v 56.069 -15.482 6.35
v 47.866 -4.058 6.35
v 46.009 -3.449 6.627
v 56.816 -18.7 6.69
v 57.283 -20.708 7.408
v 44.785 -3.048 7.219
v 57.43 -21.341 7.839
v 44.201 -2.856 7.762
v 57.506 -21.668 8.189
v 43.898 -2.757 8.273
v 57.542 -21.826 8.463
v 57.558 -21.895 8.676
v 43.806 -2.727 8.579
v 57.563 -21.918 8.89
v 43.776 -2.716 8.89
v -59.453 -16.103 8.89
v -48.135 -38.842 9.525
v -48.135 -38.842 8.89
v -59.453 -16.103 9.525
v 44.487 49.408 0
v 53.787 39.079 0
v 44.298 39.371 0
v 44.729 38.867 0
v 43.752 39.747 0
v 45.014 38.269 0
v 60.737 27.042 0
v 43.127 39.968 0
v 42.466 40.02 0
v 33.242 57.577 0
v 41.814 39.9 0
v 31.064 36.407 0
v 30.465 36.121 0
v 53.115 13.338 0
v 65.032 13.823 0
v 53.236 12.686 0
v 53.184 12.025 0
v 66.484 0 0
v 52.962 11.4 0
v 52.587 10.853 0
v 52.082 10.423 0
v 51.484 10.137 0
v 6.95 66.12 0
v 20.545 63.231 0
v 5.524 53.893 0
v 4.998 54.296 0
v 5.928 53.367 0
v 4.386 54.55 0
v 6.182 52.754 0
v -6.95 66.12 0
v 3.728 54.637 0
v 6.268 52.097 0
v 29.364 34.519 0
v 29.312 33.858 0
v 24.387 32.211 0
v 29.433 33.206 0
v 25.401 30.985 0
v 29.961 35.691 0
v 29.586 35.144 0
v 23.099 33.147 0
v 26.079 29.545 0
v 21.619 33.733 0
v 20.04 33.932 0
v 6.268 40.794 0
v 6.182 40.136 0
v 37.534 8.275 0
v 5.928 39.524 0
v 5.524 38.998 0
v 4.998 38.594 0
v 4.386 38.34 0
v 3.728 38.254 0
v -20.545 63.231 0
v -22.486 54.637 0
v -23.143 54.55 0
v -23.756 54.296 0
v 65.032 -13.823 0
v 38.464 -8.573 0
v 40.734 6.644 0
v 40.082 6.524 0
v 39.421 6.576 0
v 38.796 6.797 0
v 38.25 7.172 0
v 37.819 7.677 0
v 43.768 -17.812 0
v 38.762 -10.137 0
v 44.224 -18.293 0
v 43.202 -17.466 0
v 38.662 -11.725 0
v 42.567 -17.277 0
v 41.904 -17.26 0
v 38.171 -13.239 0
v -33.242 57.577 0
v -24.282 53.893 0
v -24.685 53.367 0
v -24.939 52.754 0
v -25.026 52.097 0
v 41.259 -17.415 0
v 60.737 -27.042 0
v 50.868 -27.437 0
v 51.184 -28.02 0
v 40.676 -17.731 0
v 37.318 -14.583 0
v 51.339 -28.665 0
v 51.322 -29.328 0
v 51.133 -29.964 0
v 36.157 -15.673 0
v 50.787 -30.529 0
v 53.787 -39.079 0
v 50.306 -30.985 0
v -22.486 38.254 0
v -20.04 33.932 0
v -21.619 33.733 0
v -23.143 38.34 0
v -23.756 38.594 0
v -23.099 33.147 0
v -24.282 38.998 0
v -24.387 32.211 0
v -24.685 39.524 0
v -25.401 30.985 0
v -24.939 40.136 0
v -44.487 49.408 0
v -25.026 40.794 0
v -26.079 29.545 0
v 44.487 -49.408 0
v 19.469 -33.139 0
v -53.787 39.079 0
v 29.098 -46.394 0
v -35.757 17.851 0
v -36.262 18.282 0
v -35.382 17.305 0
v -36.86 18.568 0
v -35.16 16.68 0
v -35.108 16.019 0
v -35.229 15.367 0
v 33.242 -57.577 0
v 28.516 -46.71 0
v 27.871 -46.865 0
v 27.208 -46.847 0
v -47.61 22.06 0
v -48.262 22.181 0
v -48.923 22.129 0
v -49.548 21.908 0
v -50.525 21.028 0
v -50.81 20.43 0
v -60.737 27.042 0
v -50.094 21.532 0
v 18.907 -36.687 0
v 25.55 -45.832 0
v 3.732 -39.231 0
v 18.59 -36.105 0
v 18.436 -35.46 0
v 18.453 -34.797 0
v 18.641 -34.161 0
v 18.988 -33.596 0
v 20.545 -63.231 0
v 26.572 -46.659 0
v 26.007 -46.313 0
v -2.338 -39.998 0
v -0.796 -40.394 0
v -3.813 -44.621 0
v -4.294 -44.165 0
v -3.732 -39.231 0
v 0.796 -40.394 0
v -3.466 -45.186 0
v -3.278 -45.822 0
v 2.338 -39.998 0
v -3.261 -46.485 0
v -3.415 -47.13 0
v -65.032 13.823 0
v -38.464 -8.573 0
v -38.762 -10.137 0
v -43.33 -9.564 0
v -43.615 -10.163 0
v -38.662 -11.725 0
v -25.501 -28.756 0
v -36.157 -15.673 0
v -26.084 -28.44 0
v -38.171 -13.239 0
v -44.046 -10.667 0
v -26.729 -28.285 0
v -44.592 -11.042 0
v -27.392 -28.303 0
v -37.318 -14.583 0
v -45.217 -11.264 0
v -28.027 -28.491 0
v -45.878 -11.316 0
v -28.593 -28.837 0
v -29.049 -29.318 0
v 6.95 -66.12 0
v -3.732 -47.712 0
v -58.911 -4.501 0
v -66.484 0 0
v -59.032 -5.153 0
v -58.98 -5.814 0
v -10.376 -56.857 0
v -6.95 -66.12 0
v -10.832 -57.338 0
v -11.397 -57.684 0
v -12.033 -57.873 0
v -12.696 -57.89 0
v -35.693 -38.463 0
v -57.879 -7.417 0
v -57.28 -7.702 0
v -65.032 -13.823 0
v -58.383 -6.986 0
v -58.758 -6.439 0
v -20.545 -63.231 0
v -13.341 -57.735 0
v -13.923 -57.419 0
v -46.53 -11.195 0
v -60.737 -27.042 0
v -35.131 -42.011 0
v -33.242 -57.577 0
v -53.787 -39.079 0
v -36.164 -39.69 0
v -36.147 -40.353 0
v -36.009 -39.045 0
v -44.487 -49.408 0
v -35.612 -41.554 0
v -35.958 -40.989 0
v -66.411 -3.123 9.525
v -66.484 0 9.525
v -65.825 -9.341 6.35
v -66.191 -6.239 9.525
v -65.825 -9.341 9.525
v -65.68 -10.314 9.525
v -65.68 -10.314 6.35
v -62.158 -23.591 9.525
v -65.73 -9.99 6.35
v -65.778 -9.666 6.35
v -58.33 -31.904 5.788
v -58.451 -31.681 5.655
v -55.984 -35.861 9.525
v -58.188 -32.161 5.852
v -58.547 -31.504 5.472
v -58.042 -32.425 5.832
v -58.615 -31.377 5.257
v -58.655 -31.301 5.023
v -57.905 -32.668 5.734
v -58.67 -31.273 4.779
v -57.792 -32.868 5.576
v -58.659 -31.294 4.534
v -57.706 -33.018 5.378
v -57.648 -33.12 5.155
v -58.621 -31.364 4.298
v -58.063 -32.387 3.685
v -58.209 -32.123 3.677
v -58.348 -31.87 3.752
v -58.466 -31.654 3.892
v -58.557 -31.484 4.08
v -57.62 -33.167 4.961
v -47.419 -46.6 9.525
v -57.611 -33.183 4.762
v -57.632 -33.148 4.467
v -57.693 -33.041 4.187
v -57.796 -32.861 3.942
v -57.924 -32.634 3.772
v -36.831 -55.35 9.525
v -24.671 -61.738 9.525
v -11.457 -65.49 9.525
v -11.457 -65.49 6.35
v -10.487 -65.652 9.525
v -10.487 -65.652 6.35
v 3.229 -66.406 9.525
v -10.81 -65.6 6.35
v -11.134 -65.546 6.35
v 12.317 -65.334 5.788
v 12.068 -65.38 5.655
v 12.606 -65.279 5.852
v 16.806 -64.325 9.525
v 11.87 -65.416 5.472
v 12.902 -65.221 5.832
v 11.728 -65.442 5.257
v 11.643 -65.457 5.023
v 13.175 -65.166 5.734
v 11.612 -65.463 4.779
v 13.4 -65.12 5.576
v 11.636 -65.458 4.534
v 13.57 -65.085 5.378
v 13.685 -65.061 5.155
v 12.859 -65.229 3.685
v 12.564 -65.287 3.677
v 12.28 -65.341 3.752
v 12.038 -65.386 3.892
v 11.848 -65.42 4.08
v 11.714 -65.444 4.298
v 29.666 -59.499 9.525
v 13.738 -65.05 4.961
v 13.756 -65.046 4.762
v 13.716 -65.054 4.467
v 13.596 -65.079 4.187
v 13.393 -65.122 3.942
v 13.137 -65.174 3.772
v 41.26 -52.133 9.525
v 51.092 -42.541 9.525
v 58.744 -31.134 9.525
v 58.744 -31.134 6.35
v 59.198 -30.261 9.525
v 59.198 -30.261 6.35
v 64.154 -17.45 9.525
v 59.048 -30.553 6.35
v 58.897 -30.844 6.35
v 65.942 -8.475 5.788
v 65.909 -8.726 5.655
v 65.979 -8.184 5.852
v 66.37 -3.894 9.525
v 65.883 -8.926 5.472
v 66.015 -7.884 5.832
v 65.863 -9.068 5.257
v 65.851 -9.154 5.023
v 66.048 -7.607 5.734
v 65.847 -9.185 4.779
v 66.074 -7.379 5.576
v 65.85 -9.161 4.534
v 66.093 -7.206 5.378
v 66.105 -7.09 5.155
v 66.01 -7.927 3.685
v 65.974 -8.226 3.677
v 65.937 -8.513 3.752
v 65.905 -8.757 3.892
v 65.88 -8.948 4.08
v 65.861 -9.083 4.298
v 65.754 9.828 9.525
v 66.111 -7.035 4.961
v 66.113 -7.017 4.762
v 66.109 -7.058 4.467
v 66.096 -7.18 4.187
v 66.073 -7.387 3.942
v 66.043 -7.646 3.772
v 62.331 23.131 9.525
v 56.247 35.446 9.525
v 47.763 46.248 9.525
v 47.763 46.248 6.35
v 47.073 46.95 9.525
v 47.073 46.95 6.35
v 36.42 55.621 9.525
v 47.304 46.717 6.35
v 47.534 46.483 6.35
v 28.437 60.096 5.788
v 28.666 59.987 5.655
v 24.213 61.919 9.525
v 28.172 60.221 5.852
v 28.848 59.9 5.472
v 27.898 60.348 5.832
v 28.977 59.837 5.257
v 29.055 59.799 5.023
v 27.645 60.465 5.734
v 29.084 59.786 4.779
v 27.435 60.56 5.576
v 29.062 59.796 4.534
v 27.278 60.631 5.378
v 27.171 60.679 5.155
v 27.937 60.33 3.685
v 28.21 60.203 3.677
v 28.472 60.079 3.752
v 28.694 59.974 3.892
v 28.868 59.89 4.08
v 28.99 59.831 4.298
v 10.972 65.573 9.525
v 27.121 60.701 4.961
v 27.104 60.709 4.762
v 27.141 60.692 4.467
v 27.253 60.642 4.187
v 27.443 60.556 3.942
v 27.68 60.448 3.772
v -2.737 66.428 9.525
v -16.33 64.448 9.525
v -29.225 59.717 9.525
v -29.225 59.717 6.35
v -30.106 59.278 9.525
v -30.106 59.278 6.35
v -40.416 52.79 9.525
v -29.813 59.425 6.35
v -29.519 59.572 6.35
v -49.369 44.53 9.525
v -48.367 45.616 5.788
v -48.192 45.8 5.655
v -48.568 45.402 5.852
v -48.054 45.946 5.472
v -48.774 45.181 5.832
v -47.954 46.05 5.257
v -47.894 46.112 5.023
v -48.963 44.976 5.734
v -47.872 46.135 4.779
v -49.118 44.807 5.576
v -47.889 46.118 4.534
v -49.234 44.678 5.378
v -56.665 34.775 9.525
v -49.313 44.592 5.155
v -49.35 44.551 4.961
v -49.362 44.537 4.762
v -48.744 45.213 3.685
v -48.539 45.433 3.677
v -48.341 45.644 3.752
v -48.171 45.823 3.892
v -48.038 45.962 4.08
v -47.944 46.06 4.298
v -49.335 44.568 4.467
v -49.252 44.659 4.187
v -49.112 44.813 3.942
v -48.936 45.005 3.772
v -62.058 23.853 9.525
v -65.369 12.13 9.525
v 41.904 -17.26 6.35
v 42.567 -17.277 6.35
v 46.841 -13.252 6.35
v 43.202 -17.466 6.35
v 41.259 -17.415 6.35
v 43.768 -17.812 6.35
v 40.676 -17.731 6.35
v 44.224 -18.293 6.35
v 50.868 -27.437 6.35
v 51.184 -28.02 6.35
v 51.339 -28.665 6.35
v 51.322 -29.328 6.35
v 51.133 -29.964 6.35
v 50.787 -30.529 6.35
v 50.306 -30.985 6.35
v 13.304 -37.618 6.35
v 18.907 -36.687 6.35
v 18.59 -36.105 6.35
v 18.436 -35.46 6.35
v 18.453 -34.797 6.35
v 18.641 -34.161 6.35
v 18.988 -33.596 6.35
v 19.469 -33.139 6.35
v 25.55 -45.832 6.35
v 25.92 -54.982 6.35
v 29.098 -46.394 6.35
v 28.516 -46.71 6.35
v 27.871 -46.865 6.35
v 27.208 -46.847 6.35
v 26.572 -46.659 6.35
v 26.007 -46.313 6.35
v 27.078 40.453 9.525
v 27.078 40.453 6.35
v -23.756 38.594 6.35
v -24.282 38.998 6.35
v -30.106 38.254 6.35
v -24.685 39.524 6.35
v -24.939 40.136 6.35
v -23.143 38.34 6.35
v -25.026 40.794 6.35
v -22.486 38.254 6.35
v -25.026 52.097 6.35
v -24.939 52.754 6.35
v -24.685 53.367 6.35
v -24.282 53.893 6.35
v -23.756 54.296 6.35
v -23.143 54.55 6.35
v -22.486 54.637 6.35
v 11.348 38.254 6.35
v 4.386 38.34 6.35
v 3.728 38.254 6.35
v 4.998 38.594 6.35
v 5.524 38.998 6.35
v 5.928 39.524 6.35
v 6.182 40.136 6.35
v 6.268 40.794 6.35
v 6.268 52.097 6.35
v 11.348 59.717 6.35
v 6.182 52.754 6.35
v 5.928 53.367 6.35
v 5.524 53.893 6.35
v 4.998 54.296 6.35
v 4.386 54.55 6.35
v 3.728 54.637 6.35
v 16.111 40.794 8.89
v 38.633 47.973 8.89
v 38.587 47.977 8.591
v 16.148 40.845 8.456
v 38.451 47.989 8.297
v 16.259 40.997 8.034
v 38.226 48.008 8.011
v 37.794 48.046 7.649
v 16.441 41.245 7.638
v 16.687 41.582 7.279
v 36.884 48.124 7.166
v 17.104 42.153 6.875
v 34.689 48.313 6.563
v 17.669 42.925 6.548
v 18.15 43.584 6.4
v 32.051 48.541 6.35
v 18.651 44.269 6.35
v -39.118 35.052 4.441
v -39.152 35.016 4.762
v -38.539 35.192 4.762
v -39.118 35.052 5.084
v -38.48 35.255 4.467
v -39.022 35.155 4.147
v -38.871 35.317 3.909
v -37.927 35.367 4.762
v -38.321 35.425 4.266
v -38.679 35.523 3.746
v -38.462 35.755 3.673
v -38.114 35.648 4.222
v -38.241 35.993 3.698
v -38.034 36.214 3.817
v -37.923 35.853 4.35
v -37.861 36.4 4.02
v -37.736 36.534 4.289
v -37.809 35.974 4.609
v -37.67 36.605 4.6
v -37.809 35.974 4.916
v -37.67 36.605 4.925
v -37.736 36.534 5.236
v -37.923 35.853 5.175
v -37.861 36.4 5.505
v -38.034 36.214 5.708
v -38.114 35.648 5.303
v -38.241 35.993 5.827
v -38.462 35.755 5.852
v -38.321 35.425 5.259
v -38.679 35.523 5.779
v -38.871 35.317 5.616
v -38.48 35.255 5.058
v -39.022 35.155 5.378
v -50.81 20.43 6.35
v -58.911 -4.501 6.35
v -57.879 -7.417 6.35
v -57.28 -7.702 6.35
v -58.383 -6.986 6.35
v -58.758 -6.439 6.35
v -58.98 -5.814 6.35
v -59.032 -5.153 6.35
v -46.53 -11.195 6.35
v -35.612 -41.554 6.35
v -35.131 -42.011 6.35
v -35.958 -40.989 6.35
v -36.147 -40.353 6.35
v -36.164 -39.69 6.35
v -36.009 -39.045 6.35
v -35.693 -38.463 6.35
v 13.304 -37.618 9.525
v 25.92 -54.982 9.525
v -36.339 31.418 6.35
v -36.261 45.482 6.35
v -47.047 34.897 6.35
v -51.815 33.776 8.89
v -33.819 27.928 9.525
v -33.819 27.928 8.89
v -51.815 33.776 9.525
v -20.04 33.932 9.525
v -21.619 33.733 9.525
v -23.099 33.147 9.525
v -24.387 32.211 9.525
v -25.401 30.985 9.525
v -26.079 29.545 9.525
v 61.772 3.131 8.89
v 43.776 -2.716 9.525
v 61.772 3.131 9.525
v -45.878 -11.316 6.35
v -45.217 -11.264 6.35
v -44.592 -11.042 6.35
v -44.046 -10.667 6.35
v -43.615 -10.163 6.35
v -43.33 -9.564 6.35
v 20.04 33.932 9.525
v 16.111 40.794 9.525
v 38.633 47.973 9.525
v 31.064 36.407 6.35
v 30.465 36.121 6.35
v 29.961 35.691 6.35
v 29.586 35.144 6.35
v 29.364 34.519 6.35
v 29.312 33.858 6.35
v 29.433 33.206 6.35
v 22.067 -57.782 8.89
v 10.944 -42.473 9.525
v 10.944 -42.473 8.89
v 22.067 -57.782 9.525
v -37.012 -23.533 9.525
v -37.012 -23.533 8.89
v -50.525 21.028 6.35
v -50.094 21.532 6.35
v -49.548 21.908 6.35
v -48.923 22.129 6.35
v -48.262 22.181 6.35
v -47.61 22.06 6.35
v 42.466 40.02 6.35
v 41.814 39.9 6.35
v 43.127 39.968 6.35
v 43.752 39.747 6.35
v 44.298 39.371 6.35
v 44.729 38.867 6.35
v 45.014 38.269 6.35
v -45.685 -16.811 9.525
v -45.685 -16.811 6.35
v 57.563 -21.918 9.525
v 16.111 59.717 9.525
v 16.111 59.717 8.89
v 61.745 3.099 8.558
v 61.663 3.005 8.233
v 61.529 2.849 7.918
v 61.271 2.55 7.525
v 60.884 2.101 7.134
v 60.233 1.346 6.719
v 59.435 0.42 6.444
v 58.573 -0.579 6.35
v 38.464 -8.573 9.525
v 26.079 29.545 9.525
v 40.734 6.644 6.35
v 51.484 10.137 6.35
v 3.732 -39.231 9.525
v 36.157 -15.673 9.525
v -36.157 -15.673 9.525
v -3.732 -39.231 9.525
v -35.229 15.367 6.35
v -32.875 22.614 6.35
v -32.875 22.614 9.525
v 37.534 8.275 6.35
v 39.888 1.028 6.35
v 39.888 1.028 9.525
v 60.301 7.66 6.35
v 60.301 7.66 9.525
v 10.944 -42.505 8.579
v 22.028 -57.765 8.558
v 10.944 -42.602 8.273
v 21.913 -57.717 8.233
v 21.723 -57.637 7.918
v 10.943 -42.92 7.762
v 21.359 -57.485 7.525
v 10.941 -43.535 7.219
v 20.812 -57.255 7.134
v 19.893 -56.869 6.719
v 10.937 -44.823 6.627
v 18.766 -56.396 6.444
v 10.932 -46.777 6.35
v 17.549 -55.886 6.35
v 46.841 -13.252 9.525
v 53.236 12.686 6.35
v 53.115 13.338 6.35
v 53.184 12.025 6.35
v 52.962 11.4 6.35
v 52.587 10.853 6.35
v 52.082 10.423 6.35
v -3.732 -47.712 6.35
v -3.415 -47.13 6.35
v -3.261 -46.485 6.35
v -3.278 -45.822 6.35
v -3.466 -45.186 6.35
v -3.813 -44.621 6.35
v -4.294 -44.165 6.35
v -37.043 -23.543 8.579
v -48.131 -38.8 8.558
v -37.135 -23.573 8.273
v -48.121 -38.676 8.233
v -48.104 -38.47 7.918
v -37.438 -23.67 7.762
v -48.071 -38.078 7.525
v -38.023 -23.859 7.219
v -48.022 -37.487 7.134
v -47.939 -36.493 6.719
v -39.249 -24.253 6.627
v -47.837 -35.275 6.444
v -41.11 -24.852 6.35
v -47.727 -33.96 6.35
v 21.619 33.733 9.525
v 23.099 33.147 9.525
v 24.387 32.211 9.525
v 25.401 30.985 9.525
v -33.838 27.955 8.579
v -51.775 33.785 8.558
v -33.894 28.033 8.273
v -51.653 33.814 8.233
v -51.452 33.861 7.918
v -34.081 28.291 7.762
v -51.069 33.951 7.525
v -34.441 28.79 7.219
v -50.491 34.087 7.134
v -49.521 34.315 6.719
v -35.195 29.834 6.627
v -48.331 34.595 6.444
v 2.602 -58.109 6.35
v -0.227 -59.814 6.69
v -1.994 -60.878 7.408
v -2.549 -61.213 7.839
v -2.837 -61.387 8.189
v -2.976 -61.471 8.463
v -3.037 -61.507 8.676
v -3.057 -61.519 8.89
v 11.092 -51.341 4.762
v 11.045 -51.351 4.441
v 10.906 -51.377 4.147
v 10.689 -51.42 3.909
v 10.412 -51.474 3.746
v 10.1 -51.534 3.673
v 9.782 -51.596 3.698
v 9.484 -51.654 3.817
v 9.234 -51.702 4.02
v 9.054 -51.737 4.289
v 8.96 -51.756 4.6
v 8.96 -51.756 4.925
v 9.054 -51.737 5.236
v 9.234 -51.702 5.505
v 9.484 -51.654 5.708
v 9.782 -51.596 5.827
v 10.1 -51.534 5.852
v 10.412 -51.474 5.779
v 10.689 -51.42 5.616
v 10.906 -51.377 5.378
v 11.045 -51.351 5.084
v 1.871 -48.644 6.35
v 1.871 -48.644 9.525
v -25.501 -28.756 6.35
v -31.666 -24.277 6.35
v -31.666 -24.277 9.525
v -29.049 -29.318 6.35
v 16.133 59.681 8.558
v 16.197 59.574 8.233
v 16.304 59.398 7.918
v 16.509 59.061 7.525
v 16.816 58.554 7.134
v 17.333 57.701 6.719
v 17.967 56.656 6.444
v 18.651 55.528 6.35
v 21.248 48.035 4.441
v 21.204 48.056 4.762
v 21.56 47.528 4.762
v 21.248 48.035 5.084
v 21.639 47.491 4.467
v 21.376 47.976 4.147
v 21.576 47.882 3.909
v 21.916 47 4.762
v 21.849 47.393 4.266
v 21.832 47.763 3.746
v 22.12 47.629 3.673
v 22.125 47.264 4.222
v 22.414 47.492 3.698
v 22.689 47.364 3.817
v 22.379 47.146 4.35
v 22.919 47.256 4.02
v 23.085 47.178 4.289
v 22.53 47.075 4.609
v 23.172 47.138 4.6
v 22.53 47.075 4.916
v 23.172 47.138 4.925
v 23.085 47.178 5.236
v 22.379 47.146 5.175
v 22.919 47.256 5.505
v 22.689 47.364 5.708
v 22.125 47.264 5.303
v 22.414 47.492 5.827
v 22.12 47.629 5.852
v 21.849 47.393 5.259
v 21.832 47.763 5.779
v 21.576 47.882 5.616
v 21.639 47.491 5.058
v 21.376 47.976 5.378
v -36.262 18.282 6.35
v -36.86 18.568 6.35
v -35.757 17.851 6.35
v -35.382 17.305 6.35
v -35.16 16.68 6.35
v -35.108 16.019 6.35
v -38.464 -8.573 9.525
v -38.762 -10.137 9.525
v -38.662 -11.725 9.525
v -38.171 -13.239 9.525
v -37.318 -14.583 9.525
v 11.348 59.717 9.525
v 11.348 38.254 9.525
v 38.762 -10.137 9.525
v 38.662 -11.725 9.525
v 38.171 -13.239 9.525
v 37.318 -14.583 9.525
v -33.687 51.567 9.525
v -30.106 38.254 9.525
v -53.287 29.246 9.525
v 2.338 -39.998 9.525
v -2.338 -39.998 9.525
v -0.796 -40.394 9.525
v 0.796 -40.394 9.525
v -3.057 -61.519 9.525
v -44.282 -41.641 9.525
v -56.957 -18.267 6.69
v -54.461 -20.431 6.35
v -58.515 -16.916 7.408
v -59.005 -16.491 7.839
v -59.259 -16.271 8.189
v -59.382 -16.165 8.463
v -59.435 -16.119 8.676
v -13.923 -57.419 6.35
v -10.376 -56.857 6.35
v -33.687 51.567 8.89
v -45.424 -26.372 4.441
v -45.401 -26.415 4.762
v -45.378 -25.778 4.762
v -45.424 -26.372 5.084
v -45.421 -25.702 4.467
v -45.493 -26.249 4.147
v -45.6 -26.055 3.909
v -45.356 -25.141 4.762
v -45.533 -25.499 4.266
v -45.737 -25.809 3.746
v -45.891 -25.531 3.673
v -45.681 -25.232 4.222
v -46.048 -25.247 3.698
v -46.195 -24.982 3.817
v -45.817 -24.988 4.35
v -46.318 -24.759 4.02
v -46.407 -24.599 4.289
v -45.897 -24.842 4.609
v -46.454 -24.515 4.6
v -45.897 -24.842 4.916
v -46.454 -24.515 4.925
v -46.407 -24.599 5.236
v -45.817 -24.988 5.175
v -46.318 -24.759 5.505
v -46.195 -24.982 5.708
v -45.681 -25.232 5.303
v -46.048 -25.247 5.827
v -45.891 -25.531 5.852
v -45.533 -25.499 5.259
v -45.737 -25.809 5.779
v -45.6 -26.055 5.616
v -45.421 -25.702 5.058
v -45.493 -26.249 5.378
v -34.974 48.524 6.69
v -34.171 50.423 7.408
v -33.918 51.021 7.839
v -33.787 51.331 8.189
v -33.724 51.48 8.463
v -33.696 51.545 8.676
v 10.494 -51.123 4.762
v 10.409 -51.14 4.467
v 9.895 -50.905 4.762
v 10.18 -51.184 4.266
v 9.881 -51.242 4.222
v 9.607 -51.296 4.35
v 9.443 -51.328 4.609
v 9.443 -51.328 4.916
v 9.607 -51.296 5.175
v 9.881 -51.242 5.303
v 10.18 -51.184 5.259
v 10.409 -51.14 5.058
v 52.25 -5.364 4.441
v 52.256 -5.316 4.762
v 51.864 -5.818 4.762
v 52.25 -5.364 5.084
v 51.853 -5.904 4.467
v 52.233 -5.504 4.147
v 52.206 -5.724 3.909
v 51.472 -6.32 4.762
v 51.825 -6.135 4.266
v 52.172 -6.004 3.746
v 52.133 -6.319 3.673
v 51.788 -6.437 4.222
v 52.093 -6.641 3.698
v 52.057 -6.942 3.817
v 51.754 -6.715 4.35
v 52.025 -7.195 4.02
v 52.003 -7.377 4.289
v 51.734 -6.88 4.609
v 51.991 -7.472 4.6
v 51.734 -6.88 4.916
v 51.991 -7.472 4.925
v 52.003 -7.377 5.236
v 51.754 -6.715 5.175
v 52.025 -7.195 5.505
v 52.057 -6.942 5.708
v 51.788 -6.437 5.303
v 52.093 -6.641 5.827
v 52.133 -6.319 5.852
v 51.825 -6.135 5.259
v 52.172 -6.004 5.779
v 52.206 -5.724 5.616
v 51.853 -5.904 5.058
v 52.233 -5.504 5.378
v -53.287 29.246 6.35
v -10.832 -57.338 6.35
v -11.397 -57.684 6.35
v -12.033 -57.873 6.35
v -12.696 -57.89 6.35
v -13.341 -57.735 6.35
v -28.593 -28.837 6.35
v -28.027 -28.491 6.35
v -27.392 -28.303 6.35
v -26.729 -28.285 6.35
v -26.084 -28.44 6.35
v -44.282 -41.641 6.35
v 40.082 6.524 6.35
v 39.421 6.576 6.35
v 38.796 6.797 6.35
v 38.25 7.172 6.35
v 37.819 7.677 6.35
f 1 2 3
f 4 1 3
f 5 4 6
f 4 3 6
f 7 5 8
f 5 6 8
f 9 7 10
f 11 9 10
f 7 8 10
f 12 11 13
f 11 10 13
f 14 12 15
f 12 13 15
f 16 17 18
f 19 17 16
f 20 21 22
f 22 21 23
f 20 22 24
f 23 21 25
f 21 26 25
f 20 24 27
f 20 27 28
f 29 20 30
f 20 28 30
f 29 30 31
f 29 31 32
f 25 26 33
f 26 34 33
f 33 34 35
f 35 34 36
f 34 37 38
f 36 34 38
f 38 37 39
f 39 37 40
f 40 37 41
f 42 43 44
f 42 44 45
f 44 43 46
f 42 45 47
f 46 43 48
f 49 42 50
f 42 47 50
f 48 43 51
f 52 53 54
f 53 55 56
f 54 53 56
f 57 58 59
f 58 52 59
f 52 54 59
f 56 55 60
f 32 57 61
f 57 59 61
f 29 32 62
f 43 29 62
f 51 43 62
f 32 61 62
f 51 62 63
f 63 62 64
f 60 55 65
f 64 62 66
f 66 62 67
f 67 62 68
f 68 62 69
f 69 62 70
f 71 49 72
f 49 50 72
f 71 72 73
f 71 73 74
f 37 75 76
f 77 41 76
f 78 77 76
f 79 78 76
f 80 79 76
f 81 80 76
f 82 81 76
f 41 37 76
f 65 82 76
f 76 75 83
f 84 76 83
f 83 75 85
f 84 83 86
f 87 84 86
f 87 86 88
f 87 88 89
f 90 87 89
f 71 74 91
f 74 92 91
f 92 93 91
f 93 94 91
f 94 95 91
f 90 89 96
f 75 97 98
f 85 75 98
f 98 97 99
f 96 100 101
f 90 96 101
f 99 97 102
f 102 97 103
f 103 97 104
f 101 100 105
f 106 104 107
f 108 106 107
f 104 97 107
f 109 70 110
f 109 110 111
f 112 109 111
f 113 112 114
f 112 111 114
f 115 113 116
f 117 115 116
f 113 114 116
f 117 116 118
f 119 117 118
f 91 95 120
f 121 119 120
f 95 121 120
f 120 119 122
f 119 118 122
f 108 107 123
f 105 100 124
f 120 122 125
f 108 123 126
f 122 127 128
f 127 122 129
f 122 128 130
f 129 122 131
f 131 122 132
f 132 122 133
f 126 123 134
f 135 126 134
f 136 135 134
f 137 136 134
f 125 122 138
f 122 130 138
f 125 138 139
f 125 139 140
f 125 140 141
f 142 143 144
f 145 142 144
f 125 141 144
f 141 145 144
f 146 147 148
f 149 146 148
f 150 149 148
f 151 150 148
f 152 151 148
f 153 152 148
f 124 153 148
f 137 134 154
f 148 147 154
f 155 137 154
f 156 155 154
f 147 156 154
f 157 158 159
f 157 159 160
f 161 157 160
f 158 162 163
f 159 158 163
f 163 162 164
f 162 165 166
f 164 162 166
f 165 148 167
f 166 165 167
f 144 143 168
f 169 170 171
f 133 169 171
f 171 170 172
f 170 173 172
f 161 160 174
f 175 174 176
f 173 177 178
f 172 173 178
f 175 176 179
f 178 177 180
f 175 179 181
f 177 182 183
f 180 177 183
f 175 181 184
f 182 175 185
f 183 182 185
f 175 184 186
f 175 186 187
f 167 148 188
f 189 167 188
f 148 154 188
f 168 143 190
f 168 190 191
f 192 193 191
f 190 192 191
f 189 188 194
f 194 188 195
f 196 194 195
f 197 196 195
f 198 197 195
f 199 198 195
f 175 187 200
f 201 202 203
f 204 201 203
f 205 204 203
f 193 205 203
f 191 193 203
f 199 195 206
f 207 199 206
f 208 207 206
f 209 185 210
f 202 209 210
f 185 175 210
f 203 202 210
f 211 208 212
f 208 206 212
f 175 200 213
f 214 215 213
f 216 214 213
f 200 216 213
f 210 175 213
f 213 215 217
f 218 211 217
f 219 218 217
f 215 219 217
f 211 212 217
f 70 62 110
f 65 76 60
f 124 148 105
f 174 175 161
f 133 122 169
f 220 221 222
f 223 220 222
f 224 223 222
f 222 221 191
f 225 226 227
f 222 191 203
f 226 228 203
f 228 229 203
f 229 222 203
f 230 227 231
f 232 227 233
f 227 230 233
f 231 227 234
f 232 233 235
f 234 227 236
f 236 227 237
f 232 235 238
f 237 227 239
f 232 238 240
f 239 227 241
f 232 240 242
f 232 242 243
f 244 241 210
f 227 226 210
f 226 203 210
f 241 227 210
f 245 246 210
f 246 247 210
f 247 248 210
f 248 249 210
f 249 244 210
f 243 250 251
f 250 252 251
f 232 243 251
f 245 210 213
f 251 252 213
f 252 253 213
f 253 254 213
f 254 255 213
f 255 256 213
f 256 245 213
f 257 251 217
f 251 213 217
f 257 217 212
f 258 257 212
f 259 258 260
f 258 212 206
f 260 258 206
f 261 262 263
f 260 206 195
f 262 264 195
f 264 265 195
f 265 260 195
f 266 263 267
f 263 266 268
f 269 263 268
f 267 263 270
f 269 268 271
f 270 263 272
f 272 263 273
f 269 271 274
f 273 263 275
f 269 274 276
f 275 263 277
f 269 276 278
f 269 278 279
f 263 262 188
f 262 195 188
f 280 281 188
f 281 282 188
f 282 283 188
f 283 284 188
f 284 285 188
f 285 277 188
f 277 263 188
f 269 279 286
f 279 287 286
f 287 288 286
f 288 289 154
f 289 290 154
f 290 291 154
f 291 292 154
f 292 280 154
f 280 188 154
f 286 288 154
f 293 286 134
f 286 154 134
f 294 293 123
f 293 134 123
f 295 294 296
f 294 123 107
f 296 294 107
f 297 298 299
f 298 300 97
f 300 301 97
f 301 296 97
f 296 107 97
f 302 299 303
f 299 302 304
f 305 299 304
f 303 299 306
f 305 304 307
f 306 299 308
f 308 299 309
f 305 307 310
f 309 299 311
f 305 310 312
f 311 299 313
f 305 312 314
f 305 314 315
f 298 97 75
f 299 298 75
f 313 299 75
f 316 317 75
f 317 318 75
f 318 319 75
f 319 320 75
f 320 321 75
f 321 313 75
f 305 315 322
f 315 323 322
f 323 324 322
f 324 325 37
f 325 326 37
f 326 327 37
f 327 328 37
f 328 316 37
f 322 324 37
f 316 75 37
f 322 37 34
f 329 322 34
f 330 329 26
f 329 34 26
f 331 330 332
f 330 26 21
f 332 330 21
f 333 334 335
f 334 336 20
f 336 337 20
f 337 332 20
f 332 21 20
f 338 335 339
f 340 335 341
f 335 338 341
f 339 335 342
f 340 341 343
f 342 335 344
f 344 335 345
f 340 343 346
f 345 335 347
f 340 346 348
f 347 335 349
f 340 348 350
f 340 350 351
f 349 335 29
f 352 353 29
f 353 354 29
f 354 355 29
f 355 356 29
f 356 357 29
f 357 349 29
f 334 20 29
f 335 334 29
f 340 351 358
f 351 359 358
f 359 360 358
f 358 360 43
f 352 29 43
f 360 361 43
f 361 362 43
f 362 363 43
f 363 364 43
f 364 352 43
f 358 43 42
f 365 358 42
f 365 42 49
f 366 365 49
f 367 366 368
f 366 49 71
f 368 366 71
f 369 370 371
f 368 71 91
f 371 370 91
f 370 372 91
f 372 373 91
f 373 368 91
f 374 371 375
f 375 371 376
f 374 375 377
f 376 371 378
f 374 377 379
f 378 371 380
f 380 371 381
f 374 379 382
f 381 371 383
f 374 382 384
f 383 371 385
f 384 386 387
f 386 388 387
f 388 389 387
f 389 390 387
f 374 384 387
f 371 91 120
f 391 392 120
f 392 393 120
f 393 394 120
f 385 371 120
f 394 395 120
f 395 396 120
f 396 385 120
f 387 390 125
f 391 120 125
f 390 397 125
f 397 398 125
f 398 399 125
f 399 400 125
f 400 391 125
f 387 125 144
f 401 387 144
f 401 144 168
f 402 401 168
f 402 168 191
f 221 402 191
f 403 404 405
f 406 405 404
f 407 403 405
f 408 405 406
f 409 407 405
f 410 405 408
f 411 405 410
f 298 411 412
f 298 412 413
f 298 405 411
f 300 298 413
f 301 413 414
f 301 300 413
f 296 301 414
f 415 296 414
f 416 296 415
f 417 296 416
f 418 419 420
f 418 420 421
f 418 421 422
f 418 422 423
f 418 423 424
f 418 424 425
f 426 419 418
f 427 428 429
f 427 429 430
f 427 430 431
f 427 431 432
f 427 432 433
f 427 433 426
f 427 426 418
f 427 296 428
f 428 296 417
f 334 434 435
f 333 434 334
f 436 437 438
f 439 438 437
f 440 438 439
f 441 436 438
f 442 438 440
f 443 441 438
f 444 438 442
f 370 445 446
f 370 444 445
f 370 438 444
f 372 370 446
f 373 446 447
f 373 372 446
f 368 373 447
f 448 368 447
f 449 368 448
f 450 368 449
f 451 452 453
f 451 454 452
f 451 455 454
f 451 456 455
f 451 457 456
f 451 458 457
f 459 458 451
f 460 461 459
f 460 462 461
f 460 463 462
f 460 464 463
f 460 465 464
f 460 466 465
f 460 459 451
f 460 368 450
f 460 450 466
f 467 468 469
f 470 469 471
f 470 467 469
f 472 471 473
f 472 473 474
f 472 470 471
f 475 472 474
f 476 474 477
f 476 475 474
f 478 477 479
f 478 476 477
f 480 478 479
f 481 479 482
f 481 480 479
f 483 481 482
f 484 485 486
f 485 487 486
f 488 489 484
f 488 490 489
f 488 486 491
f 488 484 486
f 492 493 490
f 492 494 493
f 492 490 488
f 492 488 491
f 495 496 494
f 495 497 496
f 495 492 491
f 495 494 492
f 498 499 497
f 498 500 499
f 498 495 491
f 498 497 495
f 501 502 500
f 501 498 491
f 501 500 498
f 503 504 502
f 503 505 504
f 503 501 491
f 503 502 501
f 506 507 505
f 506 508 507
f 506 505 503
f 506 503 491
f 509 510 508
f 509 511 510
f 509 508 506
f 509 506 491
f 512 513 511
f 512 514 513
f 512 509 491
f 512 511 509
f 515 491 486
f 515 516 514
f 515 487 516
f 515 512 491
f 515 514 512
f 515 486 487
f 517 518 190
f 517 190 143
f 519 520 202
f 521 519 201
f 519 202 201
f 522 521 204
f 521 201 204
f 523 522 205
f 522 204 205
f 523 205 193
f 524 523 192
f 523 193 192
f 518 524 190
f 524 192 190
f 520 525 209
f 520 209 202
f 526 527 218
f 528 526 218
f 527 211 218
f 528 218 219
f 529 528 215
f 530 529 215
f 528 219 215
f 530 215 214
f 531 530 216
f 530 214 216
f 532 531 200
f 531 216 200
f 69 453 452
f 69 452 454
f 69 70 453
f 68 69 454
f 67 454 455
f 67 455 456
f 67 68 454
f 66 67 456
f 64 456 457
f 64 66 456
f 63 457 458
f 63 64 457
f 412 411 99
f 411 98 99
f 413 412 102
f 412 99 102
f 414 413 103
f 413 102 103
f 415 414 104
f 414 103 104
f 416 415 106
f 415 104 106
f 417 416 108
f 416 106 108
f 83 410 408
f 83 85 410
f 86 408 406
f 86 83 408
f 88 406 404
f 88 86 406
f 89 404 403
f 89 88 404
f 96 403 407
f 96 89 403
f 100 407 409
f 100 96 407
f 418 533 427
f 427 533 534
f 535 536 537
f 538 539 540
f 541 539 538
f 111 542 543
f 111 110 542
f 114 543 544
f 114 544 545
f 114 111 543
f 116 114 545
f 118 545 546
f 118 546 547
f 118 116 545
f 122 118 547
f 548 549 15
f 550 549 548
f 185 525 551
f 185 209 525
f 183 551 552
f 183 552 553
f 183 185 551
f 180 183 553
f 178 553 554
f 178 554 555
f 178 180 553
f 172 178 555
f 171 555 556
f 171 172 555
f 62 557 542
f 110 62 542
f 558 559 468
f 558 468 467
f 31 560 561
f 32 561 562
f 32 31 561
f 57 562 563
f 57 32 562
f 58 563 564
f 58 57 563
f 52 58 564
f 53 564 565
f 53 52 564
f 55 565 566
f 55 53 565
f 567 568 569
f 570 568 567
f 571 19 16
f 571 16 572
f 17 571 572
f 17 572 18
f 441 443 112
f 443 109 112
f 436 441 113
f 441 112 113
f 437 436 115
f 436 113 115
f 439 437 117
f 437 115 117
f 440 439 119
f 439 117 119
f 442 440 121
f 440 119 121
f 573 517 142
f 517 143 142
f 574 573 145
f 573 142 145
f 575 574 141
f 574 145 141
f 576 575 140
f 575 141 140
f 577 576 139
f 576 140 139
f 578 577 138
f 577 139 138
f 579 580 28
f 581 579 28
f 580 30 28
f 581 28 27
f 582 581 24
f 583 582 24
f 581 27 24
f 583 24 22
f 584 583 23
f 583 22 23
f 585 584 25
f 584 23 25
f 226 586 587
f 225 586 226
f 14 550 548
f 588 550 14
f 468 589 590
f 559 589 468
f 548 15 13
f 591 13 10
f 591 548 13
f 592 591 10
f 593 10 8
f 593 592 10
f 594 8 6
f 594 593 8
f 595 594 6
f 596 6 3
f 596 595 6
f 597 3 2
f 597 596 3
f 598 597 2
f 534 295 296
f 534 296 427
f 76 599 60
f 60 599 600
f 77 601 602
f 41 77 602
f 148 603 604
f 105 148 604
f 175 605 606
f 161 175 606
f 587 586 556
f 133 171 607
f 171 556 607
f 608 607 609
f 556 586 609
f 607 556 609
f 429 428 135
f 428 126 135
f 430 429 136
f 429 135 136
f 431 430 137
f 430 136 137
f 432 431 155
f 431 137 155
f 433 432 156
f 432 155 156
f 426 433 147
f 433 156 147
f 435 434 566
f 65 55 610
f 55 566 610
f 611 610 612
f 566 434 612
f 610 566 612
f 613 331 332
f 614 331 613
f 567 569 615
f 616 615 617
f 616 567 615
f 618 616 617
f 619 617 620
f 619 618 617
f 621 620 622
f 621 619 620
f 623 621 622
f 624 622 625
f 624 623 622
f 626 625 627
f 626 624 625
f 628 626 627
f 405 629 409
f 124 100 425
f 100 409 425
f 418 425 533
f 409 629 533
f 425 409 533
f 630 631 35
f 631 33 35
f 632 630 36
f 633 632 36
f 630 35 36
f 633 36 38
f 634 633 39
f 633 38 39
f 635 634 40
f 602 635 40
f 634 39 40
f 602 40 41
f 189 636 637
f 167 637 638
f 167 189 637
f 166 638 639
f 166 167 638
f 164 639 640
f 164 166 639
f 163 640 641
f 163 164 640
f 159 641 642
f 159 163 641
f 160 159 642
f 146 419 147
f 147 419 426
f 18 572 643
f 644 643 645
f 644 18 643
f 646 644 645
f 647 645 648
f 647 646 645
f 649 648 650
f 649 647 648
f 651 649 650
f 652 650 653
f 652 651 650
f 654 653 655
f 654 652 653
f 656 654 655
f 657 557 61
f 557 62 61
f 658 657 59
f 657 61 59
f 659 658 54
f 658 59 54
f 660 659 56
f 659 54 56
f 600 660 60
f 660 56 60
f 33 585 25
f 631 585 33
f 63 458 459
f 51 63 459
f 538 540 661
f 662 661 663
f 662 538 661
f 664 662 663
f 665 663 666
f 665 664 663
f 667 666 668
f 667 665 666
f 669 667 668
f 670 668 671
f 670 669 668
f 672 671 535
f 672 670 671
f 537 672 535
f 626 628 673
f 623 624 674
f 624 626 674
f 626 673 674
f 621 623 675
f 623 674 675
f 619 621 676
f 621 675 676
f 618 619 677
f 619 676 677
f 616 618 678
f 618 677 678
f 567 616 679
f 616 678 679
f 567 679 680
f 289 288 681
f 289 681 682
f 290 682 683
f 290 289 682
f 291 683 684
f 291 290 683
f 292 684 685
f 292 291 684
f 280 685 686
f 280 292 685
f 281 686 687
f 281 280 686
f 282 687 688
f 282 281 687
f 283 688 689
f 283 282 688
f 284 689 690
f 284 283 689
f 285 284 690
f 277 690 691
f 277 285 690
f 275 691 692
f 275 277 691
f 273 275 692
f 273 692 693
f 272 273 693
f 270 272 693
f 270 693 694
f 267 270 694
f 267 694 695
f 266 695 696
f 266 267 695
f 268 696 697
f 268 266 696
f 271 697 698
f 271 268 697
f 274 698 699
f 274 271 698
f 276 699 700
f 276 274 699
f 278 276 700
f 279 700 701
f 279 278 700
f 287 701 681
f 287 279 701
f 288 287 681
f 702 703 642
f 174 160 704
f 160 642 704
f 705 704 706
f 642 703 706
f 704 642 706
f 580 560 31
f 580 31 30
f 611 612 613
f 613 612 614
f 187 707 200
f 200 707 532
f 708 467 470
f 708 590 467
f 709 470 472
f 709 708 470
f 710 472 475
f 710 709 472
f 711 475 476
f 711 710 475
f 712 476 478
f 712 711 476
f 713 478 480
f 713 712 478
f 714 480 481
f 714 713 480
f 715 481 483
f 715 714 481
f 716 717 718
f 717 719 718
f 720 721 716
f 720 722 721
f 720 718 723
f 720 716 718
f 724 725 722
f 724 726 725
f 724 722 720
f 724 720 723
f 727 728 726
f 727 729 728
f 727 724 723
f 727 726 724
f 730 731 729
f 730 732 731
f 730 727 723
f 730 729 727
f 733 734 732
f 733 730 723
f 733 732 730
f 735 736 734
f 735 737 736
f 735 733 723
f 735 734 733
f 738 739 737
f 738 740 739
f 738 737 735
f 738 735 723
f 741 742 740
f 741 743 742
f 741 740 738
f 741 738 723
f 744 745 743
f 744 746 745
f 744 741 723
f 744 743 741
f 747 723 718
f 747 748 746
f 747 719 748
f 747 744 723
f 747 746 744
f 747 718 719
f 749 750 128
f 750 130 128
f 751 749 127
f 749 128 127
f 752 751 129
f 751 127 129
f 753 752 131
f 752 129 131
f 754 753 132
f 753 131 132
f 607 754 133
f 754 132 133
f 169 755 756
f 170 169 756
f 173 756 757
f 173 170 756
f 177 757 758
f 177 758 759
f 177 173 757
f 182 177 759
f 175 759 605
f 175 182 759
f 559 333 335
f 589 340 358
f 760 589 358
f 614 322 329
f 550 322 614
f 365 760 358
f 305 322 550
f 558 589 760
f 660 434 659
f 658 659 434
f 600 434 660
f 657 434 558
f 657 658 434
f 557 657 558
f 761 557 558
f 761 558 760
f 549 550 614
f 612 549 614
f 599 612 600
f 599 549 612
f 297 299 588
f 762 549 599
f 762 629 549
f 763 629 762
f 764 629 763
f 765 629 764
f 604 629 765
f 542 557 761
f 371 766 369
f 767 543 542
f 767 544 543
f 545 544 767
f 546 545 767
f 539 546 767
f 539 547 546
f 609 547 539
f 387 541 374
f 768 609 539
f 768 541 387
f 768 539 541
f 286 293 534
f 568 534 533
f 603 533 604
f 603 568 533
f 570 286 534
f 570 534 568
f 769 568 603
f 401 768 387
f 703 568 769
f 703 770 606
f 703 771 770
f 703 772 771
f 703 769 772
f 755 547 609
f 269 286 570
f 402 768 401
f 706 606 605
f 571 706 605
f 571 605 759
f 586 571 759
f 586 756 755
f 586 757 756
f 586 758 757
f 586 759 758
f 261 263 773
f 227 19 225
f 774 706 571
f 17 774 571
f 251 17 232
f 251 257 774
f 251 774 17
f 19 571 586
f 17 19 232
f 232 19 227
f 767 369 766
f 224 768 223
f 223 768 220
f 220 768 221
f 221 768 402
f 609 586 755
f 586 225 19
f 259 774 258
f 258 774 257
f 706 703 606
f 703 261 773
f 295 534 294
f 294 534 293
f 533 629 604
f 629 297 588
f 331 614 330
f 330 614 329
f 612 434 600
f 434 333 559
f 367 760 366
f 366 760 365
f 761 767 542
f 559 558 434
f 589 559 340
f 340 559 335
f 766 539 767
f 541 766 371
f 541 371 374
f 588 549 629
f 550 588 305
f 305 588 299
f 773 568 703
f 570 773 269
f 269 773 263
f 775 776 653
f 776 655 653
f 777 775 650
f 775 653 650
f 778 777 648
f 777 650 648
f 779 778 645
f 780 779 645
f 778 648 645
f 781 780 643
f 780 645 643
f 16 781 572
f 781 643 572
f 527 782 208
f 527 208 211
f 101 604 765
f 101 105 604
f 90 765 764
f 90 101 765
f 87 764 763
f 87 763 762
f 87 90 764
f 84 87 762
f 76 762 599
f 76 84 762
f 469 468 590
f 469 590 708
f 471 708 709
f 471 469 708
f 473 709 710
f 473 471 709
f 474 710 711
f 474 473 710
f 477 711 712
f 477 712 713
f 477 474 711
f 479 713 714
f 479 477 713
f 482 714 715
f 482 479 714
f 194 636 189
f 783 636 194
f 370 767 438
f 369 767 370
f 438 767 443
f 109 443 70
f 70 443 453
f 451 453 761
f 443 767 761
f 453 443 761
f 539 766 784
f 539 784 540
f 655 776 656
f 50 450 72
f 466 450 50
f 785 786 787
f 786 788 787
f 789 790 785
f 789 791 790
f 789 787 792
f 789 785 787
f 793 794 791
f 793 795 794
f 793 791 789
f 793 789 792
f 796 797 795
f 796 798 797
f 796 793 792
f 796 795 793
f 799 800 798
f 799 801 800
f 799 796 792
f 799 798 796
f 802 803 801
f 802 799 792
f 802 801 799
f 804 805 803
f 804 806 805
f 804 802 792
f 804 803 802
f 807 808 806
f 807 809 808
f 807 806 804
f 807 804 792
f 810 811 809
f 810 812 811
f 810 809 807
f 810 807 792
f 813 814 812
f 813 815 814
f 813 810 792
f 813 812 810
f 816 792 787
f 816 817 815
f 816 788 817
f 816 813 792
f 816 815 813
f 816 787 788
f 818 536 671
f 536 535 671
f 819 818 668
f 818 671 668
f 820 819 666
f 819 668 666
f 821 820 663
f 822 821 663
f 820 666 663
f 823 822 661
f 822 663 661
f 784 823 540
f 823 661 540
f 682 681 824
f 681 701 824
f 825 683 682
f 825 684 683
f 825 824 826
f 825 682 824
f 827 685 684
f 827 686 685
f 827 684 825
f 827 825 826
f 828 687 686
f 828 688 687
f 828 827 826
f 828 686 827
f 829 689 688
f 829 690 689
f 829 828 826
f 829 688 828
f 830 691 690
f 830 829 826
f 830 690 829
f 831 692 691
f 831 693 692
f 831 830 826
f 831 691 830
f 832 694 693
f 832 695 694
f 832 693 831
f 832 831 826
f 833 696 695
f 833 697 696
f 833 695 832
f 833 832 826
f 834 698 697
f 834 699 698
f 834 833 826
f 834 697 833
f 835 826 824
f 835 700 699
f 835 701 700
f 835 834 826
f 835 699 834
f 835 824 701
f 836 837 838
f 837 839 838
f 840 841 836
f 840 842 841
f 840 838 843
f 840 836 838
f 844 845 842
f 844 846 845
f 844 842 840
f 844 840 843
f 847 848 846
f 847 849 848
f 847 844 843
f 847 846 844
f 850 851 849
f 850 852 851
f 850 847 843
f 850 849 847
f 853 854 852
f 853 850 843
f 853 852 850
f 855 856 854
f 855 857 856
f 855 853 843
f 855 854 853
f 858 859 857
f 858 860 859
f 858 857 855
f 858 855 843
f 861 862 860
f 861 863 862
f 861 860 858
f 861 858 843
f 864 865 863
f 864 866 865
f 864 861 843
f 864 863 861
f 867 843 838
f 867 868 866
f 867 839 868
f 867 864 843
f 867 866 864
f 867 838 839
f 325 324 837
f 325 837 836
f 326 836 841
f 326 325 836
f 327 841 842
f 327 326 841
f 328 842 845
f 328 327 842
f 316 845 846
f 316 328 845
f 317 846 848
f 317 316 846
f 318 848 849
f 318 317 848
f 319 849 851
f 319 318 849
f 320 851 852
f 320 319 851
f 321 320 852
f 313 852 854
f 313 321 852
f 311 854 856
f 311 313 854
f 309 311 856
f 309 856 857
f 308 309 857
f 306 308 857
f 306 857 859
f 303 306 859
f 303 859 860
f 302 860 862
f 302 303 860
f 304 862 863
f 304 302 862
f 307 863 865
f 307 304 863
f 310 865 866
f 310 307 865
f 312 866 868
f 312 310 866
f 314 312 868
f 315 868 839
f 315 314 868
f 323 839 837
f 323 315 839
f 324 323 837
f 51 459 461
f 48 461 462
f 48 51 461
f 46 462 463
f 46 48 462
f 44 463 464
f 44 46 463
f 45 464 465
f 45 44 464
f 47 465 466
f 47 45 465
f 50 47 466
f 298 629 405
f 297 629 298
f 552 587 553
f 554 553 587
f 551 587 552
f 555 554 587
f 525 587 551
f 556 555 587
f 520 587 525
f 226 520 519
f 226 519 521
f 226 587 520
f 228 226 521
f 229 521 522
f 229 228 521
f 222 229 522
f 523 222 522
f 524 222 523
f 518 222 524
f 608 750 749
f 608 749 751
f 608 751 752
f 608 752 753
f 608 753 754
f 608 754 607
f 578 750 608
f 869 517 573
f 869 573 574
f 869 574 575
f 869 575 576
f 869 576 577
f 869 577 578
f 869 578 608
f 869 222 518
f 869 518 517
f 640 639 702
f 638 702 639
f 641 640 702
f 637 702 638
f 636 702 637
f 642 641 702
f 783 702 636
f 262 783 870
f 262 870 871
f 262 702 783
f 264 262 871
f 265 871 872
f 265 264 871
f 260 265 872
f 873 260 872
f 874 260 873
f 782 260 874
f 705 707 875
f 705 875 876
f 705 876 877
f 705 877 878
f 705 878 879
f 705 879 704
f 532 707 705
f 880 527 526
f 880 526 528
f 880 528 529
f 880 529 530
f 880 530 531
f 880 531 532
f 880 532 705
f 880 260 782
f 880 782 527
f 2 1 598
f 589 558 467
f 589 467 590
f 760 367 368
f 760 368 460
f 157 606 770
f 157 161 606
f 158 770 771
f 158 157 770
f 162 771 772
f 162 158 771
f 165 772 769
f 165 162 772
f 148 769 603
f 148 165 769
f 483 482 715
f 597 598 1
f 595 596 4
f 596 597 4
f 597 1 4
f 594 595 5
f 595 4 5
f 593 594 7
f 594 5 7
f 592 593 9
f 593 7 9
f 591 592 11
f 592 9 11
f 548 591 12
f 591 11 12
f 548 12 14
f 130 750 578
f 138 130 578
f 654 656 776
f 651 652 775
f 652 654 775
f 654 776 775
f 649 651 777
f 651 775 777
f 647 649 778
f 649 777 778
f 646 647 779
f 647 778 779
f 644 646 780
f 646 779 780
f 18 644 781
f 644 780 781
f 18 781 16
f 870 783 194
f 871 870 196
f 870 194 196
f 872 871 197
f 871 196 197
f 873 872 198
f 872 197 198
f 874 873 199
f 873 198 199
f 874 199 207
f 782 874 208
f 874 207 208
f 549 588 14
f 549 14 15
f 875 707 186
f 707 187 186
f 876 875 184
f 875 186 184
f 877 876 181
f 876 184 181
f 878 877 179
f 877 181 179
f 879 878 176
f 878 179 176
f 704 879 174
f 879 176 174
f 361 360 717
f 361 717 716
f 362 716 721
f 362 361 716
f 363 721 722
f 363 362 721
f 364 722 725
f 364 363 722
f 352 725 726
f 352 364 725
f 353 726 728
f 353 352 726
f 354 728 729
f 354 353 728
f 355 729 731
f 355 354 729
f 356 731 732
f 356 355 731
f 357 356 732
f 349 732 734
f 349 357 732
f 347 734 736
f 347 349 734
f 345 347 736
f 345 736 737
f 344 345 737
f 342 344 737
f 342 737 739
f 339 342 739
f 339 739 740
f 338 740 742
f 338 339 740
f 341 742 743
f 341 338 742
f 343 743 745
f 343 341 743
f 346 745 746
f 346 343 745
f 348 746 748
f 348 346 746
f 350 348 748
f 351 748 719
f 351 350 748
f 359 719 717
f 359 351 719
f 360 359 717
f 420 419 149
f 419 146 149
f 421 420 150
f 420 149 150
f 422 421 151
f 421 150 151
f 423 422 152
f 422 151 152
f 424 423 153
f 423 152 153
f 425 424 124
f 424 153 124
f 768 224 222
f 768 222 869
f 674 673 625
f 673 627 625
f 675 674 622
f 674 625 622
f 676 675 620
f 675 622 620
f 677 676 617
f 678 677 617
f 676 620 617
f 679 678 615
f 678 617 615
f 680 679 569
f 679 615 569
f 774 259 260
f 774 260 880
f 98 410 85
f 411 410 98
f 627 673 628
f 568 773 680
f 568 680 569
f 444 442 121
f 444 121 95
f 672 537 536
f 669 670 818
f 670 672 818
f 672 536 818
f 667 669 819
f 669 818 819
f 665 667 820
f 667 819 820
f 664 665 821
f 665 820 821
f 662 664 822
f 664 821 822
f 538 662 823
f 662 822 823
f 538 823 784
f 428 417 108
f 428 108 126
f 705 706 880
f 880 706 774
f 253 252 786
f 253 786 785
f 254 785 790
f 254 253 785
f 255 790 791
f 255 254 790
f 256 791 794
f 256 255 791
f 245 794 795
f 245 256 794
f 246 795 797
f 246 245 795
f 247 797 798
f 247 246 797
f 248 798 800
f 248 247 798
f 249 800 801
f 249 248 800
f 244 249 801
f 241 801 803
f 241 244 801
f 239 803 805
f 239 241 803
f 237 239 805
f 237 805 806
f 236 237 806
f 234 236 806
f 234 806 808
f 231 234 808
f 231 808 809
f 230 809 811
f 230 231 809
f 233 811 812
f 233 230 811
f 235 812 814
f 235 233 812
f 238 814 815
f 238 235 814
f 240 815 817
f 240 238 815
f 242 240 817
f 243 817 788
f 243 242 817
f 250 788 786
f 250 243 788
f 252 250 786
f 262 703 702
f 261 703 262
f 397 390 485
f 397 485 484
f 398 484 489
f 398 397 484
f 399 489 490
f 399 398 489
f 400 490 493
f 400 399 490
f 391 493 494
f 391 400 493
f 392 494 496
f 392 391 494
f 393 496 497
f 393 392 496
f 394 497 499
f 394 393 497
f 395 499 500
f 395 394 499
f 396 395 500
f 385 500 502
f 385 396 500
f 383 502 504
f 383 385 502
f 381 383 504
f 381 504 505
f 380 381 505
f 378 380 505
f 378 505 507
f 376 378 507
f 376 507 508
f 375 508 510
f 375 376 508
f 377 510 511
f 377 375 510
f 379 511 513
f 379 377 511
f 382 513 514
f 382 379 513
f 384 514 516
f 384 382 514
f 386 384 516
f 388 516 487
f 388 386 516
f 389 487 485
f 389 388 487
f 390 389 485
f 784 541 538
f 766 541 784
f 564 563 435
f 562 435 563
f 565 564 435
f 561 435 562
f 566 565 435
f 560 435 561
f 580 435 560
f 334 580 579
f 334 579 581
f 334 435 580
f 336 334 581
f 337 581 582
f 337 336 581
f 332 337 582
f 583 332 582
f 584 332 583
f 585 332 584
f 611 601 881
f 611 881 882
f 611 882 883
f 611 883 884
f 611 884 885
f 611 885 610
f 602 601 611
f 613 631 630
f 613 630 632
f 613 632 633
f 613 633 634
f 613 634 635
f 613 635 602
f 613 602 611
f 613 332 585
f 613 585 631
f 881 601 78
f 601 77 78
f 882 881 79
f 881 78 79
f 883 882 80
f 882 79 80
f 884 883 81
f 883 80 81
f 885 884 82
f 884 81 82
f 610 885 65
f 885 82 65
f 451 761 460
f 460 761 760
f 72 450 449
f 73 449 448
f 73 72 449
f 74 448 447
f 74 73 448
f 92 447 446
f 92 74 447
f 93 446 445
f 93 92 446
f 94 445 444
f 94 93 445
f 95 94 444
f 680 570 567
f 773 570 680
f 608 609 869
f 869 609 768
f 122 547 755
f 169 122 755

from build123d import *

# Parameters (mm, degrees)
SKETCH1_R                = 66.4845
BOSS_EXTRUDE1_DEPTH      = 9.525
CUT_EXTRUDE1_DEPTH       = 95.504513678
FILLET1_R                = 6.35
SKETCH3_W                = 41.453999896
SKETCH3_H                = 21.463
CUT_EXTRUDE5_DEPTH       = 3.175
SKETCH4_W                = 31.293999896
SKETCH4_H                = 16.383
CUT_EXTRUDE6_DEPTH       = 95.237465907
FILLET2_R                = 2.54
CIRPATTERN1_COUNT        = 5
FILLET2_OF_CIRPATTERN1_R = 2.54


with BuildPart() as part:
    # Sketch1 → Boss-Extrude1 (new body)
    with BuildSketch(Plane.XY):
        with Locations(Location((0, 0, 0), (0, 0, 180))):
            Circle(SKETCH1_R)
    extrude(amount=BOSS_EXTRUDE1_DEPTH)

    # Sketch2 → Cut-Extrude1 (cut, through all)
    with BuildSketch(Plane.XY.offset(9.525)):
        Polygon((24.653254911, 33.93229434), (-24.653254911, 33.93229434), (-39.889804379, -12.960983122), (0, -41.942622437), (39.889804379, -12.960983122), align=None)
    extrude(amount=-CUT_EXTRUDE1_DEPTH, mode=Mode.SUBTRACT)

    # Fillet1
    fillet1_edges = [part.edges().sort_by_distance(p)[0] for p in [
        (24.653254911, 33.93229434, 4.7625),
        (39.889804379, -12.960983122, 4.7625),
        (0, -41.942622437, 4.7625),
        (-39.889804379, -12.960983122, 4.7625),
        (-24.653254911, 33.93229434, 4.7625),
    ]]
    fillet(fillet1_edges, radius=FILLET1_R)

    # Sketch3 → Cut-Extrude5 (cut)
    with BuildSketch(Plane.XY.offset(9.525)):
        Polygon((16.110904278, 40.793694229), (16.110904278, 59.716694229), (38.633115128, 47.973184599), align=None)
        with Locations((-9.37859567, 48.985194229)):
            Rectangle(SKETCH3_W, SKETCH3_H)
    cut_extrude5 = extrude(amount=-CUT_EXTRUDE5_DEPTH, mode=Mode.SUBTRACT)

    # Sketch4 → Cut-Extrude6 (cut, through all)
    with BuildSketch(Plane.XY.offset(6.35)):
        with Locations((-9.37859567, 46.445194229)):
            Rectangle(SKETCH4_W, SKETCH4_H)
    cut_extrude6 = extrude(amount=-CUT_EXTRUDE6_DEPTH, mode=Mode.SUBTRACT)

    # Fillet2
    fillet2_edges = [part.edges().sort_by_distance(p)[0] for p in [
        (27.372009703, 44.383439414, 6.35),
        (16.110904278, 50.255194229, 6.35),
        (27.372009703, 53.844939414, 6.35),
        (-25.025595618, 38.253694229, 3.175),
        (-25.025595618, 54.636694229, 3.175),
        (6.268404278, 54.636694229, 3.175),
        (6.268404278, 38.253694229, 3.175),
    ]]
    fillet(fillet2_edges, radius=FILLET2_R)

    # Sketch7 → #44 (0.086) Diameter Hole1 (revolve, cut)
    with BuildSketch(Plane(origin=(28.097563823, 60.255420067, 4.7625), x_dir=(-0.9063077870366496, 0.4226182617407002, 0), z_dir=(0, 0, 1))):
        Polygon((0, 0), (0, 14.626259968), (1.0922, 13.97), (1.0922, 0), align=None)
    f_44_0_086_diameter_hole1 = revolve(axis=Axis((30.781189785, 66.010474515, 4.7625), (-0.42261826174070033, -0.9063077870366496, 0)), mode=Mode.SUBTRACT)

    # CirPattern1: Cut-Extrude5, Cut-Extrude6, #44 (0.086) Diameter Hole1 ×5 about axis
    cirpattern1_axis = Axis((0, 0, 0), (0, 0, 1))
    add([cut_extrude5.rotate(cirpattern1_axis, i * 360 / CIRPATTERN1_COUNT) for i in range(1, CIRPATTERN1_COUNT)], mode=Mode.SUBTRACT)
    add([cut_extrude6.rotate(cirpattern1_axis, i * 360 / CIRPATTERN1_COUNT) for i in range(1, CIRPATTERN1_COUNT)], mode=Mode.SUBTRACT)
    add([f_44_0_086_diameter_hole1.rotate(cirpattern1_axis, i * 360 / CIRPATTERN1_COUNT) for i in range(1, CIRPATTERN1_COUNT)], mode=Mode.SUBTRACT)

    # Fillet2 of CirPattern1
    fillet2_of_cirpattern1_edges = [part.edges().sort_by_distance(p)[0] for p in [
        (-33.752743102, 39.74756524, 6.35),
        (-42.816986733, 30.852089569, 6.35),
        (-42.751164331, 42.671329532, 6.35),
        (-44.114759509, -11.979714172, 3.175),
        (-59.695918416, -6.917088753, 3.175),
        (-50.025540626, 22.845273769, 3.175),
        (-34.44438172, 17.78264835, 3.175),
        (-48.232352153, -19.818093126, 6.35),
        (-42.573257375, -31.187554251, 6.35),
        (-53.793682318, -27.472607418, 6.35),
        (-2.238825164, -45.657564763, 3.175),
        (-11.868510953, -58.911690182, 3.175),
        (-37.18588869, -40.517538558, 3.175),
        (-27.556202902, -27.263413139, 3.175),
        (3.943510114, -51.995820384, 6.35),
        (16.505266663, -50.127058123, 6.35),
        (9.504840278, -59.650334676, 6.35),
        (42.731089463, -16.238212695, 3.175),
        (52.360775251, -29.492338114, 3.175),
        (27.043397513, -47.886489738, 3.175),
        (17.413711725, -34.632364319, 3.175),
        (50.669575439, -12.317091144, 6.35),
        (52.774073166, 0.207328575, 6.35),
        (59.667996668, -9.393326852, 6.35),
        (28.648090829, 35.621797401, 3.175),
        (44.229249735, 40.68442282, 3.175),
        (53.899627525, 10.922060298, 3.175),
        (38.318468619, 5.859434879, 3.175),
    ]]
    fillet(fillet2_of_cirpattern1_edges, radius=FILLET2_OF_CIRPATTERN1_R)


solid = part.part
